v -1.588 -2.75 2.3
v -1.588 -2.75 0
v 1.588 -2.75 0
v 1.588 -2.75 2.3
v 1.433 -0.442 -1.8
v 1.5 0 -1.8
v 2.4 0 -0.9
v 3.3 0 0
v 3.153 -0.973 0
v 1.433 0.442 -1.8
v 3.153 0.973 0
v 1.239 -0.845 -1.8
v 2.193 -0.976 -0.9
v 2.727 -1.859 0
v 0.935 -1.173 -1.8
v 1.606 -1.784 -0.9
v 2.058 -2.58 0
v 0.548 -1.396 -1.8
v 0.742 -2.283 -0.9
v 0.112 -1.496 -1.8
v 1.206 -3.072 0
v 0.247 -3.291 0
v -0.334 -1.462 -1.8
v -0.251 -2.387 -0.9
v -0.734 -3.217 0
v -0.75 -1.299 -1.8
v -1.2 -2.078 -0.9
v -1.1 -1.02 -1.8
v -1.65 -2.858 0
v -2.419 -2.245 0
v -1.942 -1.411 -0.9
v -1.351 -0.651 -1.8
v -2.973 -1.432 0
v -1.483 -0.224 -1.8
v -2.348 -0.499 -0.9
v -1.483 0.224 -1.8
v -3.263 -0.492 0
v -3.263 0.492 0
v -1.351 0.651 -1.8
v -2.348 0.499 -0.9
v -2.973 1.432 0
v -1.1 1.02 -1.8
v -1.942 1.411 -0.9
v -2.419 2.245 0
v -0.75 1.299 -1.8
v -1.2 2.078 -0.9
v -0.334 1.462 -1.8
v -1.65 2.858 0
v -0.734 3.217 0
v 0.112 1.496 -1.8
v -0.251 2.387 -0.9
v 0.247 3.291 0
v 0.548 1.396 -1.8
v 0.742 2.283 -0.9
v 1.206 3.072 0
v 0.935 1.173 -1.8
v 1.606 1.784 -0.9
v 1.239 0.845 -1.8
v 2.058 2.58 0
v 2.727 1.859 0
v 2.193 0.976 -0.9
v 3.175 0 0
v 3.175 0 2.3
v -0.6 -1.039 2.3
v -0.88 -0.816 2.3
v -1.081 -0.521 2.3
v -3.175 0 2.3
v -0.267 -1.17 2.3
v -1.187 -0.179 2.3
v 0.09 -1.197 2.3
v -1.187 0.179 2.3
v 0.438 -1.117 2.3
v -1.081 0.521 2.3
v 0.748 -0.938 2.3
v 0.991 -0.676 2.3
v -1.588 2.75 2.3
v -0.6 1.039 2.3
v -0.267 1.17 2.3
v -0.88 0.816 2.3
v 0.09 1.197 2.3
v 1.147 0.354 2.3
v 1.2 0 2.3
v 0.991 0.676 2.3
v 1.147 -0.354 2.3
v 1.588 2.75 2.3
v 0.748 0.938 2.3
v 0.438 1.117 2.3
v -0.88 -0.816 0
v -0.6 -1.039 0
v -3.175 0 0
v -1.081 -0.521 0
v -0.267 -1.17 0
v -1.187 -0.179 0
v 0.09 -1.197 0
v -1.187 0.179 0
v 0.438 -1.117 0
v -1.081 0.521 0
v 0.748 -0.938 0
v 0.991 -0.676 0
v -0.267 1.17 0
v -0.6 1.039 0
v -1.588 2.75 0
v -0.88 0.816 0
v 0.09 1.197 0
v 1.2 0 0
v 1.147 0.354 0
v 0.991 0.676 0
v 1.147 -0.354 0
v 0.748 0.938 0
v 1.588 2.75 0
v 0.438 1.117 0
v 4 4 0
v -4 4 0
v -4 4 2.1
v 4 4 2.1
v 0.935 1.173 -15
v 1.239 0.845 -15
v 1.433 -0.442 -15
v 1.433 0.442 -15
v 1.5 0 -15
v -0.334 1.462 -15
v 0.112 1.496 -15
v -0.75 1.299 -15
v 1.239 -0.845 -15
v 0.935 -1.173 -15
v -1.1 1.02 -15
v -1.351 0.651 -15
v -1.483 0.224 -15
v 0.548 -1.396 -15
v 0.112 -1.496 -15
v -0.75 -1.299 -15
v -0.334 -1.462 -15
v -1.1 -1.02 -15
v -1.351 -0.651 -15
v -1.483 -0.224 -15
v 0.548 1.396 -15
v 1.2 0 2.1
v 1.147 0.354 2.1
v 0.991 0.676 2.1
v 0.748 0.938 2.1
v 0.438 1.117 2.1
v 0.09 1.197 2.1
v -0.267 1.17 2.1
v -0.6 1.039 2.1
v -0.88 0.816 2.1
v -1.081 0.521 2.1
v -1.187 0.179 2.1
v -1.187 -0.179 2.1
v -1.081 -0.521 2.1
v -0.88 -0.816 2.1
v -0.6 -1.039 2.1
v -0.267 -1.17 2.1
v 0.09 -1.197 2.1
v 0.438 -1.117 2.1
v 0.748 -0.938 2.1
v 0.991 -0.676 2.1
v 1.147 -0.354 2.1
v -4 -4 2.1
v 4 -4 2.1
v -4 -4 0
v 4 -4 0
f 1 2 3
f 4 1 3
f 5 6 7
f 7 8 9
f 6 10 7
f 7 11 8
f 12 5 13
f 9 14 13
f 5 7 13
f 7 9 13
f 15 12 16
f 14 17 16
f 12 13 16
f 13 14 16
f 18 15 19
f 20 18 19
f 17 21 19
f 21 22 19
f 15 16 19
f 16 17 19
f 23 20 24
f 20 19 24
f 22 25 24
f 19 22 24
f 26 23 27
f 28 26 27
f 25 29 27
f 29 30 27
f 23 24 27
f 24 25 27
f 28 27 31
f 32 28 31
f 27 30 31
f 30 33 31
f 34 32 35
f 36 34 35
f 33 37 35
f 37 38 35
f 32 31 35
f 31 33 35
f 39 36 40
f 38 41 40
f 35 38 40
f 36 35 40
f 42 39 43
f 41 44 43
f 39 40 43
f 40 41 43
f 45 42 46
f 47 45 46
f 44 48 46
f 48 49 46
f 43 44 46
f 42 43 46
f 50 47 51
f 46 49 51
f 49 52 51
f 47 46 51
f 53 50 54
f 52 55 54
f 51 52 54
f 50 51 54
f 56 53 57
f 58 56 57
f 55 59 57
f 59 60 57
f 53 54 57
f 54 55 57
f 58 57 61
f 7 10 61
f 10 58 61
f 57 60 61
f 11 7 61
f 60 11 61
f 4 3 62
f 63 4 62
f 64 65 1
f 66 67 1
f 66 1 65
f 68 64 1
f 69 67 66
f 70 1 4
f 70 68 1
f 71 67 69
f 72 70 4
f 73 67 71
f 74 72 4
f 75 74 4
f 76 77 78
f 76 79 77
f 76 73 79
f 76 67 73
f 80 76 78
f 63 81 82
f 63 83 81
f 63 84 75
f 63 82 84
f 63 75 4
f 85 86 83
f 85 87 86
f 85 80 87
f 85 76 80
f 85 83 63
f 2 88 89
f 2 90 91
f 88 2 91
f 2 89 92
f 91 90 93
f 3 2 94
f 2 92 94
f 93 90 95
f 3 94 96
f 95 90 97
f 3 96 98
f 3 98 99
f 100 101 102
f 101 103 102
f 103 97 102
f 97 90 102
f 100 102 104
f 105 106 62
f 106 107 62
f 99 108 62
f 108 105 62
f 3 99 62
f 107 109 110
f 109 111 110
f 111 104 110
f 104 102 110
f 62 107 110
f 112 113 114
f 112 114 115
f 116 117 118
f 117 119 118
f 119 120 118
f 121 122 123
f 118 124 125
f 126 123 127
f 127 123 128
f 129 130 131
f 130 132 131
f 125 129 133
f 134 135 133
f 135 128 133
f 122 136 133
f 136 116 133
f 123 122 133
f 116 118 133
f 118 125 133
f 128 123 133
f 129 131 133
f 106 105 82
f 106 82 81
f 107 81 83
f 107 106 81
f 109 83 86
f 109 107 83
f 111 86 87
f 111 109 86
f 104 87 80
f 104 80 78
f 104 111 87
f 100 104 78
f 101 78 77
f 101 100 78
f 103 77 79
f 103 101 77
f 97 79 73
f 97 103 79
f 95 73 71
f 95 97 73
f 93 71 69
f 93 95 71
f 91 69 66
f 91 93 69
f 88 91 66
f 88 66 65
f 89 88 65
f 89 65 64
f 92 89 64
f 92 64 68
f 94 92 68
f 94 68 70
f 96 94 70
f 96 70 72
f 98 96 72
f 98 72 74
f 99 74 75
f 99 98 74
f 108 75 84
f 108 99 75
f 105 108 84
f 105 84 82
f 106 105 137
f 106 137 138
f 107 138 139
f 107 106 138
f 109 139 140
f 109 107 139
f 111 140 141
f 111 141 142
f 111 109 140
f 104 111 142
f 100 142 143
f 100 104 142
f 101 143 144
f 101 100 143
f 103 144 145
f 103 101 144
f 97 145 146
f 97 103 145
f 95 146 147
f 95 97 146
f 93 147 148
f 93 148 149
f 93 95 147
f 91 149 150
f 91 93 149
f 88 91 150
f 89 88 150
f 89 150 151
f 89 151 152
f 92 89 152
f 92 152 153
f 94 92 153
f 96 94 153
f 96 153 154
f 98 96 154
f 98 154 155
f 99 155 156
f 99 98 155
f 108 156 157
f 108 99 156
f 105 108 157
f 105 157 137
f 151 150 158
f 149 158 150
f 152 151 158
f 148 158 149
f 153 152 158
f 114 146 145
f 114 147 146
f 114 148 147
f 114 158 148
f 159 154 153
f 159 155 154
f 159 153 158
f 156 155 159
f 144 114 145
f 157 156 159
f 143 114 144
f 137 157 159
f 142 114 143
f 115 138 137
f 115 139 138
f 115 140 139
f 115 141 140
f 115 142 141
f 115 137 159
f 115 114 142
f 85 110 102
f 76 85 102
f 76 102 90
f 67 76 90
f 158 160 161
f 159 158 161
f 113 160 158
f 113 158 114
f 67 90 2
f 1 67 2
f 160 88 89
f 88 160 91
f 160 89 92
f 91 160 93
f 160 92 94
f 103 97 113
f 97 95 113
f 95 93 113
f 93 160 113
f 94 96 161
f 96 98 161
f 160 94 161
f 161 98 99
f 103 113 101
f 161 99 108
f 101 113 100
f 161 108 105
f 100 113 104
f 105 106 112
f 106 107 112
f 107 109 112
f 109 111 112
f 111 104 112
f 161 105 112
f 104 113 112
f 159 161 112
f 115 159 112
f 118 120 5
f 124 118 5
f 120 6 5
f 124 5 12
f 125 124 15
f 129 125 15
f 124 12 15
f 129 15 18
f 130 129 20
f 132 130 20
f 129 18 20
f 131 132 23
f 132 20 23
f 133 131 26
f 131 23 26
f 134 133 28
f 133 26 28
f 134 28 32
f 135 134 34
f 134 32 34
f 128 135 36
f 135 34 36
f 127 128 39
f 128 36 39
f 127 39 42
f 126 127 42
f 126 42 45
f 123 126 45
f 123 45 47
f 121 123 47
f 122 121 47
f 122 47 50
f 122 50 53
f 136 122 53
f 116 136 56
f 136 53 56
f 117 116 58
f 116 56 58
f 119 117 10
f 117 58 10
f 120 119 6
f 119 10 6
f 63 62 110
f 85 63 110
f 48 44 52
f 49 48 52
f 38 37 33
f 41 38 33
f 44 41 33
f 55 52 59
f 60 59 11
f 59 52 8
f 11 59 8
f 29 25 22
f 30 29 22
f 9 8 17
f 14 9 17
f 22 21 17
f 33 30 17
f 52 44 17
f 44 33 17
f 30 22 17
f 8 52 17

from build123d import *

# Parameters (mm, degrees)
F0_R     = 1.2
F1_DEPTH = 2.3
F2_W     = 8
F2_H     = 8
F2_R     = 1.2
F3_DEPTH = 2.1


with BuildPart() as f1:
    # F0 (on Top) → F1 (new body)
    with BuildSketch(Plane.XY):
        Polygon((3.1754264805, 0), (1.5877132403, 2.75), (-1.5877132403, 2.75), (-3.1754264805, 0), (-1.5877132403, -2.75), (1.5877132403, -2.75), align=None)
        Circle(F0_R, mode=Mode.SUBTRACT)
    extrude(amount=F1_DEPTH)


with BuildPart() as f3:
    # F2 (on Top) → F3 (new body)
    with BuildSketch(Plane.XY):
        Rectangle(F2_W, F2_H)
        Circle(F2_R, mode=Mode.SUBTRACT)
    extrude(amount=F3_DEPTH)


with BuildPart() as f5:
    # F4 (on Front) → F5 (revolve)
    with BuildSketch(Plane.XZ):
        Polygon((3.3, 0), (0, 0), (0, -15), (1.5, -15), (1.5, -1.8), align=None)
    revolve(axis=Axis((0, 0, -7.5), (0, 0, -1)))


solid = Compound([f1.part, f3.part, f5.part])
